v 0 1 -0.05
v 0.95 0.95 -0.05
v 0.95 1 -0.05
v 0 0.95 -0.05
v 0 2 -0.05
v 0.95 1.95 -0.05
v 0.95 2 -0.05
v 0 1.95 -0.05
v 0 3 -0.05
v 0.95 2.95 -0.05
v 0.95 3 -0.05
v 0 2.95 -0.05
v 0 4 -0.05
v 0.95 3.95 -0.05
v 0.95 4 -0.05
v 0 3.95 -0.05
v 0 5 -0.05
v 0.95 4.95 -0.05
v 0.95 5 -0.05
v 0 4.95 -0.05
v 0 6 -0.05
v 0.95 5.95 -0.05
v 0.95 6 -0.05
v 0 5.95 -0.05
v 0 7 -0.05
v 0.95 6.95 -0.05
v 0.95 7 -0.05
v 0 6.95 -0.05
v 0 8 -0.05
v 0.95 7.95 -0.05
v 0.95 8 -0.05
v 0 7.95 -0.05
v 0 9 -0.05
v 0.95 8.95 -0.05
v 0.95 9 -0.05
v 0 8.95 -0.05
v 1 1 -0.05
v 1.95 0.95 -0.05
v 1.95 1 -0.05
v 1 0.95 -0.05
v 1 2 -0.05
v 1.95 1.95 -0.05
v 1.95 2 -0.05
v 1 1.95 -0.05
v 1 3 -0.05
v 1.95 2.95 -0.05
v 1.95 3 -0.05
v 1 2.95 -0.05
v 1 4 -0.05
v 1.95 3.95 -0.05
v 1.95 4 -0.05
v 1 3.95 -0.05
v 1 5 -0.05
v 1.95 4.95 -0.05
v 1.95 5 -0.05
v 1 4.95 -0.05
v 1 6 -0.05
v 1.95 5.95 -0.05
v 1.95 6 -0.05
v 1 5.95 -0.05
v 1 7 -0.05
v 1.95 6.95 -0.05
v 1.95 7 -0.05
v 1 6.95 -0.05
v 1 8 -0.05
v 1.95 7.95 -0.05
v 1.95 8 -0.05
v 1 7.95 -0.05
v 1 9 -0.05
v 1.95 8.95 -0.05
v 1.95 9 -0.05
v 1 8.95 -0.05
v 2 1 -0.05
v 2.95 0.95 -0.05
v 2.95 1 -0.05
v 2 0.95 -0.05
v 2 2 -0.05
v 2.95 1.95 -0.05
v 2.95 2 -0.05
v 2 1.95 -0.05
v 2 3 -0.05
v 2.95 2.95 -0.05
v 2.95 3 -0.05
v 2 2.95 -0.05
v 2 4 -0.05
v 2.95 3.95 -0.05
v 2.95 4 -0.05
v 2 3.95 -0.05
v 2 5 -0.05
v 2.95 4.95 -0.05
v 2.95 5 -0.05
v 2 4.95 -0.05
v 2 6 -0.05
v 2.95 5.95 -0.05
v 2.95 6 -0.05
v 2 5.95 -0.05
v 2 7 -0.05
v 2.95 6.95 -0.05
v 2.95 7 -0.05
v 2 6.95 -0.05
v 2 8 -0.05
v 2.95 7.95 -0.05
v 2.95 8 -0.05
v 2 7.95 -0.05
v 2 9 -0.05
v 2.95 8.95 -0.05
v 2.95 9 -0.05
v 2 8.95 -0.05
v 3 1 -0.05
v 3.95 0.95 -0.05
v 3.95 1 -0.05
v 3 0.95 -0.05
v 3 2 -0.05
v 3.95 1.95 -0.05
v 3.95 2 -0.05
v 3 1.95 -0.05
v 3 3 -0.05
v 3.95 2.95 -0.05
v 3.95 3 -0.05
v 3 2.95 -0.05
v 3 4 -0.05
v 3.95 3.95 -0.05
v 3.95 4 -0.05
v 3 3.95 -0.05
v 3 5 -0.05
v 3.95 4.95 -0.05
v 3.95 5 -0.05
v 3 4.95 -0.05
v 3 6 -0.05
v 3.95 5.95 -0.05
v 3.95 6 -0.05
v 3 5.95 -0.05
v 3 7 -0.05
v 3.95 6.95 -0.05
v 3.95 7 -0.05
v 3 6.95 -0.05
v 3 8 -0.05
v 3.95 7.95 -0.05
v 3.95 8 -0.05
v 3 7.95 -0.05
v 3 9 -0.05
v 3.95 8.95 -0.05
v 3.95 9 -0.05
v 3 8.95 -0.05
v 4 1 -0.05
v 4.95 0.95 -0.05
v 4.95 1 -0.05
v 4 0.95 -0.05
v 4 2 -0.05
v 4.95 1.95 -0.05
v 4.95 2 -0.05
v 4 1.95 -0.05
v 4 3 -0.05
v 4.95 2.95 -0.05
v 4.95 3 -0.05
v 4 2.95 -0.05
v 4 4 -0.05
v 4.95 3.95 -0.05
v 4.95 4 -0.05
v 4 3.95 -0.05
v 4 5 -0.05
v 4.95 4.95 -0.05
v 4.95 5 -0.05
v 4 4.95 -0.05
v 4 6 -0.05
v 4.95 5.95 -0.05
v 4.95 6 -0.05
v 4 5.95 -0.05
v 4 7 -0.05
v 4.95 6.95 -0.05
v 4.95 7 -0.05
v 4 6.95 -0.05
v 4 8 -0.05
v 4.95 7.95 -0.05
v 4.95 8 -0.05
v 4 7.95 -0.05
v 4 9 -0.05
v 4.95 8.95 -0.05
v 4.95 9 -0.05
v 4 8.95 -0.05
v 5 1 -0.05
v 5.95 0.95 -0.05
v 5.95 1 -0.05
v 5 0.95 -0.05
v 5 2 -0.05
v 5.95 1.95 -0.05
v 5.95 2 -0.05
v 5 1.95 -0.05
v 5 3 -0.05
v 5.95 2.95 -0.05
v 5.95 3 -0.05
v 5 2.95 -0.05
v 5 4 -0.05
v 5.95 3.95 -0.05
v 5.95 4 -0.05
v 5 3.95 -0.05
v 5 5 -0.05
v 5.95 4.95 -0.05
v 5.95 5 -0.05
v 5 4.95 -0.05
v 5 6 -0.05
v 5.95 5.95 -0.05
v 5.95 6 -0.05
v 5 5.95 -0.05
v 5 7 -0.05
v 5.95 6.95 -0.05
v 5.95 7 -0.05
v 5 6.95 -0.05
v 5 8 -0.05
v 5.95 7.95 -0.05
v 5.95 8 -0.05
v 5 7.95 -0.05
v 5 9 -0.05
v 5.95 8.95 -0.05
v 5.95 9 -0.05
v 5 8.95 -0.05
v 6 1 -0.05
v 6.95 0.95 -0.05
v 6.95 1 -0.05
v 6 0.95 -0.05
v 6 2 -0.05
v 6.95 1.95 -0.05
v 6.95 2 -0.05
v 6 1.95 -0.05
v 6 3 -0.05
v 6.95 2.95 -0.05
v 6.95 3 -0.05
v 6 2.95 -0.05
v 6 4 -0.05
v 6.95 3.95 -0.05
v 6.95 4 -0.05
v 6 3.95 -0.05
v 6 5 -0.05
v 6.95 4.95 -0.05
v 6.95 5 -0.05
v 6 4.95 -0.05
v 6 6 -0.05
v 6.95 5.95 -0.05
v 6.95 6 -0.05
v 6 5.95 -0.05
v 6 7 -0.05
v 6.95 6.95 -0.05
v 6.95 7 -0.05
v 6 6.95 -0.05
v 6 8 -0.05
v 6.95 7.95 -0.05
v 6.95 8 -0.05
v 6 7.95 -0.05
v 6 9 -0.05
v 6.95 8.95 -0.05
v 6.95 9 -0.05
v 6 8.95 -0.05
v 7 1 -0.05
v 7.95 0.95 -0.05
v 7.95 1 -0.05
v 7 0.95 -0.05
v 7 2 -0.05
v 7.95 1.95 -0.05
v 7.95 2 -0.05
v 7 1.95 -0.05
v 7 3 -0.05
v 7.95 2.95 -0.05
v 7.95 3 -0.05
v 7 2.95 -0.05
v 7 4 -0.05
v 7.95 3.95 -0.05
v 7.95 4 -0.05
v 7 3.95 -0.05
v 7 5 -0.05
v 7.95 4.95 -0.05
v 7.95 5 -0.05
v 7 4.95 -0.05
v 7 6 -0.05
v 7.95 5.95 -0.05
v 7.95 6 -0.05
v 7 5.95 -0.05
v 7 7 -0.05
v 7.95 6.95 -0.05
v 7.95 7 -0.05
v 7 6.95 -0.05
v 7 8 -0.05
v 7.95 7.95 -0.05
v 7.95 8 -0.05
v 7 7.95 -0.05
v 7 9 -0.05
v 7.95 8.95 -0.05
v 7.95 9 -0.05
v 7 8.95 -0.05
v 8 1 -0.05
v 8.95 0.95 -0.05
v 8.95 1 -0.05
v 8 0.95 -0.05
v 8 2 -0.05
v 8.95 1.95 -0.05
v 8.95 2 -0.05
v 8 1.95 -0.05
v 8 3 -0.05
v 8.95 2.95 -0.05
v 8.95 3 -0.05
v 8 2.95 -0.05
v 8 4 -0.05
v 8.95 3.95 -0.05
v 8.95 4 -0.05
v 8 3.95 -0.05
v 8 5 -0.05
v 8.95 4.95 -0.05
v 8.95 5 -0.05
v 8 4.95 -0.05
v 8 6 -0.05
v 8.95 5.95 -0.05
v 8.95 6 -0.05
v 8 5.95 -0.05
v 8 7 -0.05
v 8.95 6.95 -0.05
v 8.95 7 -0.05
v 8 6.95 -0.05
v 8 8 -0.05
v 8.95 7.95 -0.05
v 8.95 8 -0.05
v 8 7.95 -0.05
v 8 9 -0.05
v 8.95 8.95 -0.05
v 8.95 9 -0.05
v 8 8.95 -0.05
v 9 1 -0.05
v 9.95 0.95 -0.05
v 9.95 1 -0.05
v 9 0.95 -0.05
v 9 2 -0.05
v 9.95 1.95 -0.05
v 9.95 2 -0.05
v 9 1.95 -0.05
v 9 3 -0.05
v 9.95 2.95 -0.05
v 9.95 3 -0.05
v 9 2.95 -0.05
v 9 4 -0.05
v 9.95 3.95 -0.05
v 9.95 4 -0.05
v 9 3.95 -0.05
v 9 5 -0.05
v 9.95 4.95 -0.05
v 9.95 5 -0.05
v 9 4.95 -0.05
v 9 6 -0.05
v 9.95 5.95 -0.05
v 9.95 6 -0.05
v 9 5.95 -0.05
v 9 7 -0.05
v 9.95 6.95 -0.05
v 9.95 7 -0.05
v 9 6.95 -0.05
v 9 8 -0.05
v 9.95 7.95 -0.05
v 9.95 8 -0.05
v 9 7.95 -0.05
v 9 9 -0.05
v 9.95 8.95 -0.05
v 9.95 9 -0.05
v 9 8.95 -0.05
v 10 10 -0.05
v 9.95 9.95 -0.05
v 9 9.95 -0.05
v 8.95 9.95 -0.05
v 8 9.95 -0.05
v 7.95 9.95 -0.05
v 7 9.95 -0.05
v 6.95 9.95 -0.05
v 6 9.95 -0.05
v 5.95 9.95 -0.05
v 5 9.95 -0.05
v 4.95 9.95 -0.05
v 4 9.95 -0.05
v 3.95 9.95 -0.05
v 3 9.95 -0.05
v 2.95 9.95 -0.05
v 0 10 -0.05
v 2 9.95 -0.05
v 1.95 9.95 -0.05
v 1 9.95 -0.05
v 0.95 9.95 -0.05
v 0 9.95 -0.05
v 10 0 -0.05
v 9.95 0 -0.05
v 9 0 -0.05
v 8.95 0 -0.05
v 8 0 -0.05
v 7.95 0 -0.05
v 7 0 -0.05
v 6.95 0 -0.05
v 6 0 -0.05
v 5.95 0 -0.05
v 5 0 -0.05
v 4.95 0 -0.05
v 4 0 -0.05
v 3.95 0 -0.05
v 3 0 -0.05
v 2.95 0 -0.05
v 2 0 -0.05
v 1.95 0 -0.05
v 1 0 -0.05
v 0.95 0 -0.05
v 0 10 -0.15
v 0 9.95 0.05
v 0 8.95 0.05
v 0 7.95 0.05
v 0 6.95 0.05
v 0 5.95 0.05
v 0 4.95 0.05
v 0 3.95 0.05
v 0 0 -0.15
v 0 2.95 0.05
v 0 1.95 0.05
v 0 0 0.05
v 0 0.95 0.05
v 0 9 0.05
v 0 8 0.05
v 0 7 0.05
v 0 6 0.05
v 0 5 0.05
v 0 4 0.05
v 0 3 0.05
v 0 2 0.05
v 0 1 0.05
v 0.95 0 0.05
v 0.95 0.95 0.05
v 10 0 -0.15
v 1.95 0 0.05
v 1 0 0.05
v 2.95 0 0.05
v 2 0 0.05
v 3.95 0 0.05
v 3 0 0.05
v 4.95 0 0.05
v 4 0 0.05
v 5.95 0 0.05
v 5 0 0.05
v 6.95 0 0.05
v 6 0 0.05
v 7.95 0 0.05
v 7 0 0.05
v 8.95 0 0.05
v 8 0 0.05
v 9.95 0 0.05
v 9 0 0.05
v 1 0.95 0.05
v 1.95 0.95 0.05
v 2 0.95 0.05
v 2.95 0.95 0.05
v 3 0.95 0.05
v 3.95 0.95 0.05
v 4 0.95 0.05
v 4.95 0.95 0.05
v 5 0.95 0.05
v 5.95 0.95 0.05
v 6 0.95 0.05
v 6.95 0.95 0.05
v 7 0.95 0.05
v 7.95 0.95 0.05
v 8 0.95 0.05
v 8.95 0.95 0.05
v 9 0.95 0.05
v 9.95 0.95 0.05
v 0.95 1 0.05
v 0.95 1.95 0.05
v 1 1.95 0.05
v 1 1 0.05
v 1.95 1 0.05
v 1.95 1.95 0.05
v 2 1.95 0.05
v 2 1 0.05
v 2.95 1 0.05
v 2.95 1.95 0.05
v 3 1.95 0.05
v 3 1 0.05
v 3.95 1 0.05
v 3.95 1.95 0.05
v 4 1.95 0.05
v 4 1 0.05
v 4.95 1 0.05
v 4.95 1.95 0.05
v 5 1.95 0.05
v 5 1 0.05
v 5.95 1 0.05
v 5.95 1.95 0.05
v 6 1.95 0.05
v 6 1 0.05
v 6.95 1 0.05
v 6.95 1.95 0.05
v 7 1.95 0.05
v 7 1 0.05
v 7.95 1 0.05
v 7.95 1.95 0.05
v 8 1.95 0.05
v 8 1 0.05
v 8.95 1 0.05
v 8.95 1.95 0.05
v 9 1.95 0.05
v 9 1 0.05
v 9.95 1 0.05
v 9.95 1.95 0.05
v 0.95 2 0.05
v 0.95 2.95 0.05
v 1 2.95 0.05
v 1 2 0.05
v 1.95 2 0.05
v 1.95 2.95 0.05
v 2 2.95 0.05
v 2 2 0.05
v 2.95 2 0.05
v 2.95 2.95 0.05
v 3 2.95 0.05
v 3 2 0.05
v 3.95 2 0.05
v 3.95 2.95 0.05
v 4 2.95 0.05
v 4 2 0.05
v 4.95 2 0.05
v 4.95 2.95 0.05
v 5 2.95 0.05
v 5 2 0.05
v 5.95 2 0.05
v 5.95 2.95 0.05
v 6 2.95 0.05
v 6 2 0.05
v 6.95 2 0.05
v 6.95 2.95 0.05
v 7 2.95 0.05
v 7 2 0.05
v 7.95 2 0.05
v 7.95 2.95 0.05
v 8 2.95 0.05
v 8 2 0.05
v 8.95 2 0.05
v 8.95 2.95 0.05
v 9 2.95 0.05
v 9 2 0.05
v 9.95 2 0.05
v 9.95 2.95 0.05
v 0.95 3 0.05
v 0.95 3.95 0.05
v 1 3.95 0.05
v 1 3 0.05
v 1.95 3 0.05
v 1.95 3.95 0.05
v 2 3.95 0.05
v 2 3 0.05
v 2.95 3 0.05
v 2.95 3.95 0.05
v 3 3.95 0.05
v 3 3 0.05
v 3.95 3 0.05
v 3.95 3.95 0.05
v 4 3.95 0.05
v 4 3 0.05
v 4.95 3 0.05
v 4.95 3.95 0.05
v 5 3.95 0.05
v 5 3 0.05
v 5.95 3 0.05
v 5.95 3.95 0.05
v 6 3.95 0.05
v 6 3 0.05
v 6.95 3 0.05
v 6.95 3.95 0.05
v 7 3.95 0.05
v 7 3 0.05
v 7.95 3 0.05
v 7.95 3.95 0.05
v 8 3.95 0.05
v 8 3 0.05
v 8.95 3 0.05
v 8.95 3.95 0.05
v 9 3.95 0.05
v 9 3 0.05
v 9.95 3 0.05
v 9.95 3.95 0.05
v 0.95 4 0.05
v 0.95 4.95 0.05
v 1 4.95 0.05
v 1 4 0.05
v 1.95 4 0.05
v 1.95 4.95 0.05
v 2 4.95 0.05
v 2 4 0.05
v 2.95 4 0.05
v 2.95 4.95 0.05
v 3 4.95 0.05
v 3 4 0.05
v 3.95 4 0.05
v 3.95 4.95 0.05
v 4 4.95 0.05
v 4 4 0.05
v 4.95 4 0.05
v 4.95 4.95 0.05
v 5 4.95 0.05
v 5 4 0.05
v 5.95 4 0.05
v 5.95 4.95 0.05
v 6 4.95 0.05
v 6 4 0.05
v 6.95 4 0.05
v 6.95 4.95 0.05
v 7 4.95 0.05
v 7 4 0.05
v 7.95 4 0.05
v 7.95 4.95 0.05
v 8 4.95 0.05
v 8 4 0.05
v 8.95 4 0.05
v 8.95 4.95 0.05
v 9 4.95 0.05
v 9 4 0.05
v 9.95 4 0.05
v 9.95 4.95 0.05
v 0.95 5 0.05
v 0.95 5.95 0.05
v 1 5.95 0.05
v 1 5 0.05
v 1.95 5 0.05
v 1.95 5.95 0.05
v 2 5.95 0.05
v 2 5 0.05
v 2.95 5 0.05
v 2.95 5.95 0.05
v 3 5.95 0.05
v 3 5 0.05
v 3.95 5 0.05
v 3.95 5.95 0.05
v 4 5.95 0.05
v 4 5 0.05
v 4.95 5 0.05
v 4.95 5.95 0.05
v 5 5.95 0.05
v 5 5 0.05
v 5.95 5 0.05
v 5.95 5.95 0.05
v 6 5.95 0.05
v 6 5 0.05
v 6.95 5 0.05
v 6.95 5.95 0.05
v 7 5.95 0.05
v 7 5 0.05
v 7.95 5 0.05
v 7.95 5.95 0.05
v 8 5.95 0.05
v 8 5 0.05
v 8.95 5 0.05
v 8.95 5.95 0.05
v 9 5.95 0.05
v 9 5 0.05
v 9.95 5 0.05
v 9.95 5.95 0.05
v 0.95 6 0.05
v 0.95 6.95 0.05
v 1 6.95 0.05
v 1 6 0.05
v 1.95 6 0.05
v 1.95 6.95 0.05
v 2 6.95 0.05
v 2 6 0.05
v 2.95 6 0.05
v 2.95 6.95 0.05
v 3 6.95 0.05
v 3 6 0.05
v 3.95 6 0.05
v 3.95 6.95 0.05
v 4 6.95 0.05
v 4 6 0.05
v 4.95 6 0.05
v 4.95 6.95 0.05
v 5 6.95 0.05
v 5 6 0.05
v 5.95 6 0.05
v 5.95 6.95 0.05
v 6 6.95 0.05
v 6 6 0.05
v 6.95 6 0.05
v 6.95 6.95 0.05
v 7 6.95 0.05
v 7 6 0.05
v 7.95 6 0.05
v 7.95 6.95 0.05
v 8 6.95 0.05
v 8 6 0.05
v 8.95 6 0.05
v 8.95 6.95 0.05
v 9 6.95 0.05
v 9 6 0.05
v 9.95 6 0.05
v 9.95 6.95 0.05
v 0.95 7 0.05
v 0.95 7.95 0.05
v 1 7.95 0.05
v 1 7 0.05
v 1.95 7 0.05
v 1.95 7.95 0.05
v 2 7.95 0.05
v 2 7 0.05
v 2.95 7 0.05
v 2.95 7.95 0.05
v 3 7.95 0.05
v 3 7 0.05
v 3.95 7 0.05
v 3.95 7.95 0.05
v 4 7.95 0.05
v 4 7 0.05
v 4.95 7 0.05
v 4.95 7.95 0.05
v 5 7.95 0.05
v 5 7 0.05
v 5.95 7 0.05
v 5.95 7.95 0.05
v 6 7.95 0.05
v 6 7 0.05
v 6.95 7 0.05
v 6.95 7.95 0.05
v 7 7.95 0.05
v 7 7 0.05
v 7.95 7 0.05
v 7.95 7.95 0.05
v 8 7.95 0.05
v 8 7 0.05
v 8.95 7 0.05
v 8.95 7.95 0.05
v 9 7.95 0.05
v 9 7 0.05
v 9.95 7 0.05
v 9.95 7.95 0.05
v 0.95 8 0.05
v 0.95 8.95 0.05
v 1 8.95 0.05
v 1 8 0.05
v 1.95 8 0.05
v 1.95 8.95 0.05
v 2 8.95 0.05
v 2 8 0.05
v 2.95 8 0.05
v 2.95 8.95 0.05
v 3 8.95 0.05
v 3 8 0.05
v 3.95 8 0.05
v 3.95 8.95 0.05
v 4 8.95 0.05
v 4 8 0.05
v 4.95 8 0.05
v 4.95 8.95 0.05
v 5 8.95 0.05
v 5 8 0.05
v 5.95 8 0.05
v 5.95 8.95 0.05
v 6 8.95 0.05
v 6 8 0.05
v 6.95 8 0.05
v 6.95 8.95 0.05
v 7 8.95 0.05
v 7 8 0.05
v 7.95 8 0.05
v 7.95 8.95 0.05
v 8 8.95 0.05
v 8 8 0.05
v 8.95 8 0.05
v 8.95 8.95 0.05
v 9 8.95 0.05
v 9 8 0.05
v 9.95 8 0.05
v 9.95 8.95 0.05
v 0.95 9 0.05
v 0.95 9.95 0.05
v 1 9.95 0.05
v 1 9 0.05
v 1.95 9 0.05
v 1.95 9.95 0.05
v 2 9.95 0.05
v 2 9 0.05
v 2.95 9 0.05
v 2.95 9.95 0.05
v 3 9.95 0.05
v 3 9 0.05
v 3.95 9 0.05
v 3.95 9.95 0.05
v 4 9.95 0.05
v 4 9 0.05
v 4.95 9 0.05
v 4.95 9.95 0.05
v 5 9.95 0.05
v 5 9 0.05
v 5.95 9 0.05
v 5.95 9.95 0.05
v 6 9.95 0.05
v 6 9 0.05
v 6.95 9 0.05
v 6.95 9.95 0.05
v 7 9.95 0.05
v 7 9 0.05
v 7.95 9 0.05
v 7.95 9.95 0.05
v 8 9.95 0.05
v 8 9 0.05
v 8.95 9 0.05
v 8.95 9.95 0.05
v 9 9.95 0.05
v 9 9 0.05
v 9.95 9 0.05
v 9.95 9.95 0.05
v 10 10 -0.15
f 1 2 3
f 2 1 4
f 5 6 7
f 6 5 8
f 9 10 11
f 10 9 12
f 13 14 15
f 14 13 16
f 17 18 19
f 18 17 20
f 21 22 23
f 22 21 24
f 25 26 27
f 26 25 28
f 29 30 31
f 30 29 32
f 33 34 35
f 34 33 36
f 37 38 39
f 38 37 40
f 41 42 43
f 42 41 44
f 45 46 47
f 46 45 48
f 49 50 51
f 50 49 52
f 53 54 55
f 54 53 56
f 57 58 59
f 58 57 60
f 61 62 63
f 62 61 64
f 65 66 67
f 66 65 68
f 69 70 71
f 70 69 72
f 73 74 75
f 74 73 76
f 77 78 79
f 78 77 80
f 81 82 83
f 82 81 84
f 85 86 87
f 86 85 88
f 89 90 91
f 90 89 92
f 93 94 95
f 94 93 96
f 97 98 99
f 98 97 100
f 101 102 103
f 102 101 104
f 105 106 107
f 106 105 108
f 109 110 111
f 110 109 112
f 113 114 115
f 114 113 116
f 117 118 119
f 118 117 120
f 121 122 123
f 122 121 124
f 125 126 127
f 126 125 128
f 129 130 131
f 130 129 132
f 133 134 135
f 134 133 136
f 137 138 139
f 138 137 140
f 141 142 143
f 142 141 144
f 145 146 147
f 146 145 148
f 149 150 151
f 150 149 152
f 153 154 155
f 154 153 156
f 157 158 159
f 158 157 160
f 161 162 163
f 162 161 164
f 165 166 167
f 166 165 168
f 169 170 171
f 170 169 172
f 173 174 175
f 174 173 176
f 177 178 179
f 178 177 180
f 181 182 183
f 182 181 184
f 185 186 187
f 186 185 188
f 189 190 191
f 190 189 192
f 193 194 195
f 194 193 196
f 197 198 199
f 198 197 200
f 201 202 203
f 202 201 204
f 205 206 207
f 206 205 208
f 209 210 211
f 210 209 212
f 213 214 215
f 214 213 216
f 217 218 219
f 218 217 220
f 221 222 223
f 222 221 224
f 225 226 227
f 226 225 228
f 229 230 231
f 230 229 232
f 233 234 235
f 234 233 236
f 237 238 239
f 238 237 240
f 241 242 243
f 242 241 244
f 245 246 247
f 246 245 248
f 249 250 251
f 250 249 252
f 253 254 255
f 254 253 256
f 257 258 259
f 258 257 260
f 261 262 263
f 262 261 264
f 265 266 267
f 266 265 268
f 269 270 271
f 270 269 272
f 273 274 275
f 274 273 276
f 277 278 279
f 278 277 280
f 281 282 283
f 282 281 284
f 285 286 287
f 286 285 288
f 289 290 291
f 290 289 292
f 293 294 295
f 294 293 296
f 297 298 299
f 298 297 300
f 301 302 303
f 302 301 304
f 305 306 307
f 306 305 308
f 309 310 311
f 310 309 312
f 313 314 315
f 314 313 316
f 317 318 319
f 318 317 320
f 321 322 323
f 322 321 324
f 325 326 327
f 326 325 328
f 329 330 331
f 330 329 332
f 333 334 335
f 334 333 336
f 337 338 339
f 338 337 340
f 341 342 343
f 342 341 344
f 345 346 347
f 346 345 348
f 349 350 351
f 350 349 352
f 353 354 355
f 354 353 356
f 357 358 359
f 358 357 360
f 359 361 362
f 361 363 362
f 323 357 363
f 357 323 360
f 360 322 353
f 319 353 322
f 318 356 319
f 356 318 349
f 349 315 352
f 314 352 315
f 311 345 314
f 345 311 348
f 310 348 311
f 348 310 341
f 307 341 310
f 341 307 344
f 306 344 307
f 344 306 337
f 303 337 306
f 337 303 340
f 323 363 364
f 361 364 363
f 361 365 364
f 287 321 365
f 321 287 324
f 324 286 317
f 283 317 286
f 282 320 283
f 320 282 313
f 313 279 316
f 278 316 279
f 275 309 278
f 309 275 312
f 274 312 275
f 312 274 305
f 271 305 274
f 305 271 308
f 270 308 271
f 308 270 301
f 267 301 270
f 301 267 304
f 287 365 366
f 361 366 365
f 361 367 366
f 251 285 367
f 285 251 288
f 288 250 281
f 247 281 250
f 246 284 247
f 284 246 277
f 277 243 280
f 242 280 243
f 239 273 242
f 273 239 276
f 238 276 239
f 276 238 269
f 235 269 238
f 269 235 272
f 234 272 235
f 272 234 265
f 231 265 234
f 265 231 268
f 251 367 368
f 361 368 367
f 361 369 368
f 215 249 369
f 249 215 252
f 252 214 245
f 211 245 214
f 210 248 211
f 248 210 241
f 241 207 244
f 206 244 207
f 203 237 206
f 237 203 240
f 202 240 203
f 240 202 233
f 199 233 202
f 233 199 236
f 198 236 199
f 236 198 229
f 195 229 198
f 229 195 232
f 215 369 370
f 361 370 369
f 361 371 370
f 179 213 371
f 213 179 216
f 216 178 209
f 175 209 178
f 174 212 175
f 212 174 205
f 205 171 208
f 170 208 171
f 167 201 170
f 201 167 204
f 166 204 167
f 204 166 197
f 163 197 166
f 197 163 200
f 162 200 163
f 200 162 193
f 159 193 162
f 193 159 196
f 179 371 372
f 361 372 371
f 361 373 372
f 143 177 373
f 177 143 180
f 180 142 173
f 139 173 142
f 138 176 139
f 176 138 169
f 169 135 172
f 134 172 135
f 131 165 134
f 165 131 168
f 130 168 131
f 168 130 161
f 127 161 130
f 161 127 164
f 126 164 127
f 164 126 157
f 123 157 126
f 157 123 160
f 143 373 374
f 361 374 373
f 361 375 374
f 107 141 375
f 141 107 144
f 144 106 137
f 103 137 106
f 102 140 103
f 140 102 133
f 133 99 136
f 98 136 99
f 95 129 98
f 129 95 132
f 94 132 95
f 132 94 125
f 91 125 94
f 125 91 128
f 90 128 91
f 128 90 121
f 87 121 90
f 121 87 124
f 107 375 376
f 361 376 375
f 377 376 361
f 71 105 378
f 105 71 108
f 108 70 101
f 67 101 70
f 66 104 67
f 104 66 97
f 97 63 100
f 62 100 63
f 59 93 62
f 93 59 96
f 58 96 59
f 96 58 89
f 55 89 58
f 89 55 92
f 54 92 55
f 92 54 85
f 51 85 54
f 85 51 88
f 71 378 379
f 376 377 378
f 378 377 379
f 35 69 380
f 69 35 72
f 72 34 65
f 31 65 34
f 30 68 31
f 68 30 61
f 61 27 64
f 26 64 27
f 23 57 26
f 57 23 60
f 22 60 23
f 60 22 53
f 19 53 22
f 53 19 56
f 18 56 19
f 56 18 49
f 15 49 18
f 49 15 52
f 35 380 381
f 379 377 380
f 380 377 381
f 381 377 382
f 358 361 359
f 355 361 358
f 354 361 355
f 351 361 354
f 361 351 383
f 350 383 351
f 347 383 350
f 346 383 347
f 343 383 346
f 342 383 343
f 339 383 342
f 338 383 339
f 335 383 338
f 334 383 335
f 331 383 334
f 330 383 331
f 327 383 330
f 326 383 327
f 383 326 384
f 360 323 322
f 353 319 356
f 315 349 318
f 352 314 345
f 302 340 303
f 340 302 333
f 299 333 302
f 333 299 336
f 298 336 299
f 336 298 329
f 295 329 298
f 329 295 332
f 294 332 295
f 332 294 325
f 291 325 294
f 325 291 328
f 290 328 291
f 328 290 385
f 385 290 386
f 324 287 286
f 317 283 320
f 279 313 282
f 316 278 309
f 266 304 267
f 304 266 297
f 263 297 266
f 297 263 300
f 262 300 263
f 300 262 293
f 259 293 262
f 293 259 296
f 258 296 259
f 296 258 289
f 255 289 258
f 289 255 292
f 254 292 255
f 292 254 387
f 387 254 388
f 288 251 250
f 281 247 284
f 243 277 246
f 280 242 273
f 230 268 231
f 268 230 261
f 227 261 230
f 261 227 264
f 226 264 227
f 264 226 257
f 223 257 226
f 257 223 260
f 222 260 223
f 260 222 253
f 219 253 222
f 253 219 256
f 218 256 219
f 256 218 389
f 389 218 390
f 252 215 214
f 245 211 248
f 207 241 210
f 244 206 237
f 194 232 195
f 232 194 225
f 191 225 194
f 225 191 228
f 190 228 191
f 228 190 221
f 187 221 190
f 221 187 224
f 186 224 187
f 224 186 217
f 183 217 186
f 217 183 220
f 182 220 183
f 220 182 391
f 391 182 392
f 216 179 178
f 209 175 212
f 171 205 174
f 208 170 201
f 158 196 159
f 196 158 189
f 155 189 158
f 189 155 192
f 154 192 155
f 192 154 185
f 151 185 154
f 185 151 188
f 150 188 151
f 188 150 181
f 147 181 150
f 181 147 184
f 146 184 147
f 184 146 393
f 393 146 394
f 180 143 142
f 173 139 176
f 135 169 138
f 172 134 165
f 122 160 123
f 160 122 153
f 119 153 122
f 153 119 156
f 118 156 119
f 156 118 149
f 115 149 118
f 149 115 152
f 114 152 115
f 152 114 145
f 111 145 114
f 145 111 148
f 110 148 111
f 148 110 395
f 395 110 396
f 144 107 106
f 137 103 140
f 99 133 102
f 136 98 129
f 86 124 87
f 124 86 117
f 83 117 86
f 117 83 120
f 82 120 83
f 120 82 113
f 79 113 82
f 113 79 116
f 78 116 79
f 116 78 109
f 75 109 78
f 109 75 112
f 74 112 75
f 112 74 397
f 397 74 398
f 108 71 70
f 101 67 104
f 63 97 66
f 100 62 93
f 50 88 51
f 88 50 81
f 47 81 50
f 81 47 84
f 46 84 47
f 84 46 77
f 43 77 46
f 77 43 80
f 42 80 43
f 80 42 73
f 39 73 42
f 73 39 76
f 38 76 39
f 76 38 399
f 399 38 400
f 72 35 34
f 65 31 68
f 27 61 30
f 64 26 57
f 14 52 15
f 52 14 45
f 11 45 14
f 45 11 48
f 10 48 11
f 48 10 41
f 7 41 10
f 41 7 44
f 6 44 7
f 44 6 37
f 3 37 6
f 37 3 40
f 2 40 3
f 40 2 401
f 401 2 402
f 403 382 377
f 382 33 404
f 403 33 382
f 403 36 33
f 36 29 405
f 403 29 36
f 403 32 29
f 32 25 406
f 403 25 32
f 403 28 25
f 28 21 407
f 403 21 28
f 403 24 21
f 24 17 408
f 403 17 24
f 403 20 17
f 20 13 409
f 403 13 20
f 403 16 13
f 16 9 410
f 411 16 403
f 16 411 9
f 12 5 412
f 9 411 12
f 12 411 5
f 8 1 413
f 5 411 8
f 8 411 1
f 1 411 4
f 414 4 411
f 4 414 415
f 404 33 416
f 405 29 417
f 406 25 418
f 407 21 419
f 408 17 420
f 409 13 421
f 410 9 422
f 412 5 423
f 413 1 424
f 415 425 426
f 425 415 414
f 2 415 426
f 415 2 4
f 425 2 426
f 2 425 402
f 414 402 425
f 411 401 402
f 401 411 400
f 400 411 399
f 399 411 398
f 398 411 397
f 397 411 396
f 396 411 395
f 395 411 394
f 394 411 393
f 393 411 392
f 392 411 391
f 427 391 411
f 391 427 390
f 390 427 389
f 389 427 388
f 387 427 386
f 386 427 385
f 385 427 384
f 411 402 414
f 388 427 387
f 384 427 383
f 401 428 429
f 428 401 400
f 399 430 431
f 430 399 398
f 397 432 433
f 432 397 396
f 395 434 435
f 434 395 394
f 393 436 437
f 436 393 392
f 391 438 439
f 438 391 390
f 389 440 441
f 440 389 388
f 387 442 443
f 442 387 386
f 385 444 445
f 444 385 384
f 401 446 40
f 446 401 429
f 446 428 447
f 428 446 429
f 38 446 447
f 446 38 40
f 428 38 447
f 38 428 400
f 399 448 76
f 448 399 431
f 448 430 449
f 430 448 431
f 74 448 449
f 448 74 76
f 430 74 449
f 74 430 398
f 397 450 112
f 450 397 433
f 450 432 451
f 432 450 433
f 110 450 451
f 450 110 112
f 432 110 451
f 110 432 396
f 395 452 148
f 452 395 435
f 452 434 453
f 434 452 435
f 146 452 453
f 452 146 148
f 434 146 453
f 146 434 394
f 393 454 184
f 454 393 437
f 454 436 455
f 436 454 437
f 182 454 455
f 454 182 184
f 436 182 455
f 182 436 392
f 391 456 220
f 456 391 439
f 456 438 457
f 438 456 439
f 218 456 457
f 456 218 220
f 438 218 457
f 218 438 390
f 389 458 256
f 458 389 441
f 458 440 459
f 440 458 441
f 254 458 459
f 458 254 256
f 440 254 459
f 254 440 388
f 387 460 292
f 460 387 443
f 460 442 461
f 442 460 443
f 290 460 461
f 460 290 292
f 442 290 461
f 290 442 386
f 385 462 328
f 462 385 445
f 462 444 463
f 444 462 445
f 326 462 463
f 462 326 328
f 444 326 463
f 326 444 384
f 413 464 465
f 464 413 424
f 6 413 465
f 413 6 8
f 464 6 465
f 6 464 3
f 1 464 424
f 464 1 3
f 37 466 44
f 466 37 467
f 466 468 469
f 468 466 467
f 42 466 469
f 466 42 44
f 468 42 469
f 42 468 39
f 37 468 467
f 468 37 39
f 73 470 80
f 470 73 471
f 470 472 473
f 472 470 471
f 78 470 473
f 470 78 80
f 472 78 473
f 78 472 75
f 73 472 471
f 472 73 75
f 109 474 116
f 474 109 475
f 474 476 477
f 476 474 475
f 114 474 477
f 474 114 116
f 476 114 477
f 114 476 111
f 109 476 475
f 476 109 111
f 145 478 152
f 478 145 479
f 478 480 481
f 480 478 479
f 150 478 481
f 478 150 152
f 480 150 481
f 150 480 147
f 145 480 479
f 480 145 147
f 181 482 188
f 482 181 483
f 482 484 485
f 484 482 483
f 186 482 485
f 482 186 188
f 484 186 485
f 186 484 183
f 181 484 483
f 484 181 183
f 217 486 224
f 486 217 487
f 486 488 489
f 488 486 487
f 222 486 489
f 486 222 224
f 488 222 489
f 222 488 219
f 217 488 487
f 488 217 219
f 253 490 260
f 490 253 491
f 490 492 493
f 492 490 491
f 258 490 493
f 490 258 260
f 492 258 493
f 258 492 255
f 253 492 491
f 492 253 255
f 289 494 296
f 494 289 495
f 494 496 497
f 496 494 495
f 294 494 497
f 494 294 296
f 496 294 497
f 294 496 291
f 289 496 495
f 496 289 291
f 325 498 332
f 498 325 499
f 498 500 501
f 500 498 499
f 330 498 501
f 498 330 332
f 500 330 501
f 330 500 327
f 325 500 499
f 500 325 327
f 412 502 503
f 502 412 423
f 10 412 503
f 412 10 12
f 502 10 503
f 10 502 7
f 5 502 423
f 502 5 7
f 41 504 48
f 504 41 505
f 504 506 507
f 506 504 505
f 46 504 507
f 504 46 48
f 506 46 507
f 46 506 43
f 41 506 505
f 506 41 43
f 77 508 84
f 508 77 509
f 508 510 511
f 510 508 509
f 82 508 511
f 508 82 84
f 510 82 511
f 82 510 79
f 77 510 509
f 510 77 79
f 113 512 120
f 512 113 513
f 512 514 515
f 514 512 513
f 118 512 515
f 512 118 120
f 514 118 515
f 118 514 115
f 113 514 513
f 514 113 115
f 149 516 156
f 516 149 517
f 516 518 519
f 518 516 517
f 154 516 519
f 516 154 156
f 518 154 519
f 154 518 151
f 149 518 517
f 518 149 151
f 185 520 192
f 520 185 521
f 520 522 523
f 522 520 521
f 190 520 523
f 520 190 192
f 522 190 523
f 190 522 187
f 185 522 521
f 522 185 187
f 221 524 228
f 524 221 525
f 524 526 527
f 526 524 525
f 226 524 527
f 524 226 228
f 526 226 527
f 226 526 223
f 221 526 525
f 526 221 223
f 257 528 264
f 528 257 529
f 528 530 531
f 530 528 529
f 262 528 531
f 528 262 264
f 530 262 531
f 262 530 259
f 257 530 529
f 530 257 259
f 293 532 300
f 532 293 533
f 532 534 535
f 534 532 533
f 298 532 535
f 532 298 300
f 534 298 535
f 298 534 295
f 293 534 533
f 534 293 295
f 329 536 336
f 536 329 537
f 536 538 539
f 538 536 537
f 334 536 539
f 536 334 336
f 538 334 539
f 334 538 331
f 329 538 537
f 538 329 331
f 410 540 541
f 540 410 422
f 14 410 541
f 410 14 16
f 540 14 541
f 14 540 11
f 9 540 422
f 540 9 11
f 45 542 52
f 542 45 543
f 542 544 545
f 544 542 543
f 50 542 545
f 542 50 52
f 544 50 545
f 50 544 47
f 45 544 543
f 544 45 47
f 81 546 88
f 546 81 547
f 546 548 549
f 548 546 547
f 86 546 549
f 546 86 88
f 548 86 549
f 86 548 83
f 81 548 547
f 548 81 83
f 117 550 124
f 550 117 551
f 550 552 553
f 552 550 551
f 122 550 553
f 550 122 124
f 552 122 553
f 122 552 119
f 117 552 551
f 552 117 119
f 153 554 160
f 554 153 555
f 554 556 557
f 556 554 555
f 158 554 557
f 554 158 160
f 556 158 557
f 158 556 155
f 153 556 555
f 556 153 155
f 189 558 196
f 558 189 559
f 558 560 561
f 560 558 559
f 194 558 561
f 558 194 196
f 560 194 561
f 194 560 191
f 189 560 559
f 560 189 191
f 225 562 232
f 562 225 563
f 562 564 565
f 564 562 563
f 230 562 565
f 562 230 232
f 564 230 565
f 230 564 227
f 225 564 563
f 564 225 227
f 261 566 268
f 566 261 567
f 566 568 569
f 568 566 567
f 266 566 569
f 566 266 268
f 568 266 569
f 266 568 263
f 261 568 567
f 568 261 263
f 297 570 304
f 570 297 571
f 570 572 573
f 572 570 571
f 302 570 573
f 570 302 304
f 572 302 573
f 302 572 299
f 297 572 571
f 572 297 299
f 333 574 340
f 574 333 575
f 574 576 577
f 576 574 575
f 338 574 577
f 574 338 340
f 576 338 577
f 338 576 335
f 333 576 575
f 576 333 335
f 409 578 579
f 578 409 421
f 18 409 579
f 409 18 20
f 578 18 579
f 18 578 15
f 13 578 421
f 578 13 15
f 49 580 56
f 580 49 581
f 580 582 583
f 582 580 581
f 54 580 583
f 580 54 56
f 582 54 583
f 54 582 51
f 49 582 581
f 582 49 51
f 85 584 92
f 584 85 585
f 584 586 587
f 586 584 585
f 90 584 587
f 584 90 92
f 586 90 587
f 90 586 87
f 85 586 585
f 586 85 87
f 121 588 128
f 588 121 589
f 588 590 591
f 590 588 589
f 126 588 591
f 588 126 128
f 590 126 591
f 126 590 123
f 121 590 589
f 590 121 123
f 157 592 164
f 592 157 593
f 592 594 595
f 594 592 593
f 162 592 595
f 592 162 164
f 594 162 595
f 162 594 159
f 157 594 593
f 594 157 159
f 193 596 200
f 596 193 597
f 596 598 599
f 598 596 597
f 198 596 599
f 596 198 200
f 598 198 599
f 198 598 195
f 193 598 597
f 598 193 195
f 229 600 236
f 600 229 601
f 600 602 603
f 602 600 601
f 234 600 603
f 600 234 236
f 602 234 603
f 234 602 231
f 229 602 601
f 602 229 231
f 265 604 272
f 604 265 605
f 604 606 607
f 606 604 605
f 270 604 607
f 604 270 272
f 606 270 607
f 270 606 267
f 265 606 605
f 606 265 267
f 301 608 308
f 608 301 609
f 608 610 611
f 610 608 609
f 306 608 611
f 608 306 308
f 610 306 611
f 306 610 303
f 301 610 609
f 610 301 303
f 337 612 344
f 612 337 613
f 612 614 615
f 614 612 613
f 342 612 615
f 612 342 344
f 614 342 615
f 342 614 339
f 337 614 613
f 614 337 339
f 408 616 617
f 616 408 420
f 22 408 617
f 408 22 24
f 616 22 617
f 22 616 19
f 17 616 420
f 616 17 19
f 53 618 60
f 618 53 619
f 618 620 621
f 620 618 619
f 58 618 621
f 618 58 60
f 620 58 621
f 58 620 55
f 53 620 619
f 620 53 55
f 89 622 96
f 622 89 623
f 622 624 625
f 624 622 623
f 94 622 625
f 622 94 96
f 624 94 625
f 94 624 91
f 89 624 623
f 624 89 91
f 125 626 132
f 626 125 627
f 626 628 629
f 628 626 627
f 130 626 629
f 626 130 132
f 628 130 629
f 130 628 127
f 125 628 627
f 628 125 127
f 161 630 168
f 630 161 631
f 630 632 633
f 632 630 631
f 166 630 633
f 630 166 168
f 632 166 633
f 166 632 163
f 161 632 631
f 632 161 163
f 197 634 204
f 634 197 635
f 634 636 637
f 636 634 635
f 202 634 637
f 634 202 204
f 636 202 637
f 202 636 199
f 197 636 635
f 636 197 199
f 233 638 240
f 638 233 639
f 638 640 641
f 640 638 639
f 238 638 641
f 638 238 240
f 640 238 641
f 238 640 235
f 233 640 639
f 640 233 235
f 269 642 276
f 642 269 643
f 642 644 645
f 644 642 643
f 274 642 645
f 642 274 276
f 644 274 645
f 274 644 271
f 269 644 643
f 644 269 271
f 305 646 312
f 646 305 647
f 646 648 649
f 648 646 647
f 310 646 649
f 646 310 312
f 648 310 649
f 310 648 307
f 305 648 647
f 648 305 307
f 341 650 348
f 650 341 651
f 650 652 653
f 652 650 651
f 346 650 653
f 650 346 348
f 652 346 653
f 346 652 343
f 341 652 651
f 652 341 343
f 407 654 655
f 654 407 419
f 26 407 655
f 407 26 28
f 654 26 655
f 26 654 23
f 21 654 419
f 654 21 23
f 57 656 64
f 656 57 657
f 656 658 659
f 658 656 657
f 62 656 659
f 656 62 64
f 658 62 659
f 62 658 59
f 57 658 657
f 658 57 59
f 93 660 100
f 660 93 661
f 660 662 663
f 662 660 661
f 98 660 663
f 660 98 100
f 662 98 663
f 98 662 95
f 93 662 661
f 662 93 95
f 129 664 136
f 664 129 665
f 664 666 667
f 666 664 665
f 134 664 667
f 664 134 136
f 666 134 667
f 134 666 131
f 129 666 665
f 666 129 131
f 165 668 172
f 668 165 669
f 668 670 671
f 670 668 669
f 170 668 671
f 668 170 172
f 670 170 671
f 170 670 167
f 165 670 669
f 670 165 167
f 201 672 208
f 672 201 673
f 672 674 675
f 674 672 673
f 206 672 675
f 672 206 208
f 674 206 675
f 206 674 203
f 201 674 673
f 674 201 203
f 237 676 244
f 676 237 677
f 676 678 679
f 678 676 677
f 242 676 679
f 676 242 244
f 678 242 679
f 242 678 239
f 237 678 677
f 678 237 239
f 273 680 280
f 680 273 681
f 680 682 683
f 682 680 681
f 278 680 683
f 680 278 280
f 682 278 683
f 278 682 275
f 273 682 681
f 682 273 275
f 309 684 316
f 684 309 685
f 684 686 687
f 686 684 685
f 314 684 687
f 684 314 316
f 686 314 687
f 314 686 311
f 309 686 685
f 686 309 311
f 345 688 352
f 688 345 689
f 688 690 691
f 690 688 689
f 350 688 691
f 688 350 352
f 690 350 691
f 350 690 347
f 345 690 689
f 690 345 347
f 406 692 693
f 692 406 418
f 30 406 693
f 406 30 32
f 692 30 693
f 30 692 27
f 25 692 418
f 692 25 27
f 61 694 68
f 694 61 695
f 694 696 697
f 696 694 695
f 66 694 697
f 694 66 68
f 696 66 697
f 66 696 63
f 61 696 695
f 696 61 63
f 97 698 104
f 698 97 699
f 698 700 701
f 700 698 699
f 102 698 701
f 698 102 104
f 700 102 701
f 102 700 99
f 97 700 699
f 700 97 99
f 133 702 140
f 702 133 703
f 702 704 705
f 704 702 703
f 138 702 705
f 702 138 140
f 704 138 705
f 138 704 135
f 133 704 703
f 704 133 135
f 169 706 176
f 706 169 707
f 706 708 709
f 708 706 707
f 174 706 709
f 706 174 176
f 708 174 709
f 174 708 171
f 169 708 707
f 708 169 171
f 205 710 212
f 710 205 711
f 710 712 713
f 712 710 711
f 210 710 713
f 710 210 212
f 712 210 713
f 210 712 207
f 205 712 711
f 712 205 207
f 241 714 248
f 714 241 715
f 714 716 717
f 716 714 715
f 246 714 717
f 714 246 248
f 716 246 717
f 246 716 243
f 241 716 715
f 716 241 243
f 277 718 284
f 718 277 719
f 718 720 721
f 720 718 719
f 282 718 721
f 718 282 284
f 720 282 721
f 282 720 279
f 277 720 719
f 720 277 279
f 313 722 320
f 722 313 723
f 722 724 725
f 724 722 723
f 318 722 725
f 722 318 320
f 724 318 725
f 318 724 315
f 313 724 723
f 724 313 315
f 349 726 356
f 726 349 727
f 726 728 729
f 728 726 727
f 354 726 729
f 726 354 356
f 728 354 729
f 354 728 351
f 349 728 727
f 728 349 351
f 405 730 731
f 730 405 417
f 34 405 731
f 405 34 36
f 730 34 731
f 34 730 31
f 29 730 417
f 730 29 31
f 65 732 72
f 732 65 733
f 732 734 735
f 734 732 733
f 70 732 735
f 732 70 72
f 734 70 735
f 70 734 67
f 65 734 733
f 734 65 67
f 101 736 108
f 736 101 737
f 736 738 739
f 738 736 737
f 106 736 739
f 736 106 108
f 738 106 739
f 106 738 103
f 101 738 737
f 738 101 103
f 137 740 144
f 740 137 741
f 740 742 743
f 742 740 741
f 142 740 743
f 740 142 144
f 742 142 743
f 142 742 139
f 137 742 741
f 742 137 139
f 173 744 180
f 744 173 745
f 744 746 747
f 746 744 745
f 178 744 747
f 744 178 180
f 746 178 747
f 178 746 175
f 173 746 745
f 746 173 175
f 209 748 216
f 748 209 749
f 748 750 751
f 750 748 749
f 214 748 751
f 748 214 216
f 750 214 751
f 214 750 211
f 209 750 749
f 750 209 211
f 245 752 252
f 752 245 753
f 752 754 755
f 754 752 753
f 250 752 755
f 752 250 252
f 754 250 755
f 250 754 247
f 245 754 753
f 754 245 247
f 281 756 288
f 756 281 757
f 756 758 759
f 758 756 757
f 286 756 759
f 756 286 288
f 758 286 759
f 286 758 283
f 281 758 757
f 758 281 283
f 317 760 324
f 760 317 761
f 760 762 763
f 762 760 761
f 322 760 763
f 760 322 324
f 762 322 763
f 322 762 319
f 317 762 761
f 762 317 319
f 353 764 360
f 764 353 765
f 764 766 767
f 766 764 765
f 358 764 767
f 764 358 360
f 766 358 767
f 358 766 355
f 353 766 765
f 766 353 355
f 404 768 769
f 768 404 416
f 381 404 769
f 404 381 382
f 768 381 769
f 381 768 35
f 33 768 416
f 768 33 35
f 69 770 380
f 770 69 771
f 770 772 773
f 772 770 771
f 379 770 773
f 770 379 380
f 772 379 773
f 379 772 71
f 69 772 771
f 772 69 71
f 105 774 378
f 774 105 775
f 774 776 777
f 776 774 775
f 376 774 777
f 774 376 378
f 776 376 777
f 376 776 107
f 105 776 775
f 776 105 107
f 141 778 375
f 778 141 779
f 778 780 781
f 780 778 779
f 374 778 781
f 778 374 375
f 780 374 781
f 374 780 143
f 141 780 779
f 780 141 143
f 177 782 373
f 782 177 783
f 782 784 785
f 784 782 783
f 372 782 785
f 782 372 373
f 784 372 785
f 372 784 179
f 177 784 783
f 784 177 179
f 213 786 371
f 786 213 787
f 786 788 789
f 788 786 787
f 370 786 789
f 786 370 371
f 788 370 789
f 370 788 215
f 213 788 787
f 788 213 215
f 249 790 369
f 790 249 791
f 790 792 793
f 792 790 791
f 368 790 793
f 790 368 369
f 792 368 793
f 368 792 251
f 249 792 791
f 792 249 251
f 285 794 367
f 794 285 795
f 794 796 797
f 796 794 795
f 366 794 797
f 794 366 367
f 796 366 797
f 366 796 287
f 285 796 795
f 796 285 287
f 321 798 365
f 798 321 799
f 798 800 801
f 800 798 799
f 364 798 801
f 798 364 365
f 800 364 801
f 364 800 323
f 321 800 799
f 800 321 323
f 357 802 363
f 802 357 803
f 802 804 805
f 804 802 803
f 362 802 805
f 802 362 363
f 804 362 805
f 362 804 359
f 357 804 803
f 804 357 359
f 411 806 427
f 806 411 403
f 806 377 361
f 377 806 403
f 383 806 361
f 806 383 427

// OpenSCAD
module Grid_01(){

color("#a8b0b2")

    for (j=[0:1:9]){
        translate([0,j,0])
        
    for (i=[0:1:9]) {
        translate([i,0,0]){
            // #linear_extrude(7, scale = 1, center = true)
            linear_extrude(0.1, scale = 1, center = true)
            square(0.95);
            }
        }          
    }
        translate([0,0,-0.1]){
        linear_extrude(0.1, scale = 1, center = true)
        square(10);
}
}


Grid_01();

// Written by Nicolì Angelo (Gengio) 2024: 
// MIT License

//Permission is hereby granted, free of charge, to any person obtaining a copy of this software and associated documentation files (the "Software"), to deal in the Software without restriction, including without limitation the rights to use, copy, modify, merge, publish, distribute, sublicense, and/or sell copies of the Software, and to permit persons to whom the Software is furnished to do so, subject to the following conditions:

//The above copyright notice and this permission notice shall be included in all copies or substantial portions of the Software.

//THE SOFTWARE IS PROVIDED "AS IS", WITHOUT WARRANTY OF ANY KIND, EXPRESS OR IMPLIED, INCLUDING BUT NOT LIMITED TO THE WARRANTIES OF MERCHANTABILITY, FITNESS FOR A PARTICULAR PURPOSE AND NONINFRINGEMENT. IN NO EVENT SHALL THE AUTHORS OR COPYRIGHT HOLDERS BE LIABLE FOR ANY CLAIM, DAMAGES OR OTHER LIABILITY, WHETHER IN AN ACTION OF CONTRACT, TORT OR OTHERWISE, ARISING FROM, OUT OF OR IN CONNECTION WITH THE SOFTWARE OR THE USE OR OTHER DEALINGS IN THE SOFTWARE.
